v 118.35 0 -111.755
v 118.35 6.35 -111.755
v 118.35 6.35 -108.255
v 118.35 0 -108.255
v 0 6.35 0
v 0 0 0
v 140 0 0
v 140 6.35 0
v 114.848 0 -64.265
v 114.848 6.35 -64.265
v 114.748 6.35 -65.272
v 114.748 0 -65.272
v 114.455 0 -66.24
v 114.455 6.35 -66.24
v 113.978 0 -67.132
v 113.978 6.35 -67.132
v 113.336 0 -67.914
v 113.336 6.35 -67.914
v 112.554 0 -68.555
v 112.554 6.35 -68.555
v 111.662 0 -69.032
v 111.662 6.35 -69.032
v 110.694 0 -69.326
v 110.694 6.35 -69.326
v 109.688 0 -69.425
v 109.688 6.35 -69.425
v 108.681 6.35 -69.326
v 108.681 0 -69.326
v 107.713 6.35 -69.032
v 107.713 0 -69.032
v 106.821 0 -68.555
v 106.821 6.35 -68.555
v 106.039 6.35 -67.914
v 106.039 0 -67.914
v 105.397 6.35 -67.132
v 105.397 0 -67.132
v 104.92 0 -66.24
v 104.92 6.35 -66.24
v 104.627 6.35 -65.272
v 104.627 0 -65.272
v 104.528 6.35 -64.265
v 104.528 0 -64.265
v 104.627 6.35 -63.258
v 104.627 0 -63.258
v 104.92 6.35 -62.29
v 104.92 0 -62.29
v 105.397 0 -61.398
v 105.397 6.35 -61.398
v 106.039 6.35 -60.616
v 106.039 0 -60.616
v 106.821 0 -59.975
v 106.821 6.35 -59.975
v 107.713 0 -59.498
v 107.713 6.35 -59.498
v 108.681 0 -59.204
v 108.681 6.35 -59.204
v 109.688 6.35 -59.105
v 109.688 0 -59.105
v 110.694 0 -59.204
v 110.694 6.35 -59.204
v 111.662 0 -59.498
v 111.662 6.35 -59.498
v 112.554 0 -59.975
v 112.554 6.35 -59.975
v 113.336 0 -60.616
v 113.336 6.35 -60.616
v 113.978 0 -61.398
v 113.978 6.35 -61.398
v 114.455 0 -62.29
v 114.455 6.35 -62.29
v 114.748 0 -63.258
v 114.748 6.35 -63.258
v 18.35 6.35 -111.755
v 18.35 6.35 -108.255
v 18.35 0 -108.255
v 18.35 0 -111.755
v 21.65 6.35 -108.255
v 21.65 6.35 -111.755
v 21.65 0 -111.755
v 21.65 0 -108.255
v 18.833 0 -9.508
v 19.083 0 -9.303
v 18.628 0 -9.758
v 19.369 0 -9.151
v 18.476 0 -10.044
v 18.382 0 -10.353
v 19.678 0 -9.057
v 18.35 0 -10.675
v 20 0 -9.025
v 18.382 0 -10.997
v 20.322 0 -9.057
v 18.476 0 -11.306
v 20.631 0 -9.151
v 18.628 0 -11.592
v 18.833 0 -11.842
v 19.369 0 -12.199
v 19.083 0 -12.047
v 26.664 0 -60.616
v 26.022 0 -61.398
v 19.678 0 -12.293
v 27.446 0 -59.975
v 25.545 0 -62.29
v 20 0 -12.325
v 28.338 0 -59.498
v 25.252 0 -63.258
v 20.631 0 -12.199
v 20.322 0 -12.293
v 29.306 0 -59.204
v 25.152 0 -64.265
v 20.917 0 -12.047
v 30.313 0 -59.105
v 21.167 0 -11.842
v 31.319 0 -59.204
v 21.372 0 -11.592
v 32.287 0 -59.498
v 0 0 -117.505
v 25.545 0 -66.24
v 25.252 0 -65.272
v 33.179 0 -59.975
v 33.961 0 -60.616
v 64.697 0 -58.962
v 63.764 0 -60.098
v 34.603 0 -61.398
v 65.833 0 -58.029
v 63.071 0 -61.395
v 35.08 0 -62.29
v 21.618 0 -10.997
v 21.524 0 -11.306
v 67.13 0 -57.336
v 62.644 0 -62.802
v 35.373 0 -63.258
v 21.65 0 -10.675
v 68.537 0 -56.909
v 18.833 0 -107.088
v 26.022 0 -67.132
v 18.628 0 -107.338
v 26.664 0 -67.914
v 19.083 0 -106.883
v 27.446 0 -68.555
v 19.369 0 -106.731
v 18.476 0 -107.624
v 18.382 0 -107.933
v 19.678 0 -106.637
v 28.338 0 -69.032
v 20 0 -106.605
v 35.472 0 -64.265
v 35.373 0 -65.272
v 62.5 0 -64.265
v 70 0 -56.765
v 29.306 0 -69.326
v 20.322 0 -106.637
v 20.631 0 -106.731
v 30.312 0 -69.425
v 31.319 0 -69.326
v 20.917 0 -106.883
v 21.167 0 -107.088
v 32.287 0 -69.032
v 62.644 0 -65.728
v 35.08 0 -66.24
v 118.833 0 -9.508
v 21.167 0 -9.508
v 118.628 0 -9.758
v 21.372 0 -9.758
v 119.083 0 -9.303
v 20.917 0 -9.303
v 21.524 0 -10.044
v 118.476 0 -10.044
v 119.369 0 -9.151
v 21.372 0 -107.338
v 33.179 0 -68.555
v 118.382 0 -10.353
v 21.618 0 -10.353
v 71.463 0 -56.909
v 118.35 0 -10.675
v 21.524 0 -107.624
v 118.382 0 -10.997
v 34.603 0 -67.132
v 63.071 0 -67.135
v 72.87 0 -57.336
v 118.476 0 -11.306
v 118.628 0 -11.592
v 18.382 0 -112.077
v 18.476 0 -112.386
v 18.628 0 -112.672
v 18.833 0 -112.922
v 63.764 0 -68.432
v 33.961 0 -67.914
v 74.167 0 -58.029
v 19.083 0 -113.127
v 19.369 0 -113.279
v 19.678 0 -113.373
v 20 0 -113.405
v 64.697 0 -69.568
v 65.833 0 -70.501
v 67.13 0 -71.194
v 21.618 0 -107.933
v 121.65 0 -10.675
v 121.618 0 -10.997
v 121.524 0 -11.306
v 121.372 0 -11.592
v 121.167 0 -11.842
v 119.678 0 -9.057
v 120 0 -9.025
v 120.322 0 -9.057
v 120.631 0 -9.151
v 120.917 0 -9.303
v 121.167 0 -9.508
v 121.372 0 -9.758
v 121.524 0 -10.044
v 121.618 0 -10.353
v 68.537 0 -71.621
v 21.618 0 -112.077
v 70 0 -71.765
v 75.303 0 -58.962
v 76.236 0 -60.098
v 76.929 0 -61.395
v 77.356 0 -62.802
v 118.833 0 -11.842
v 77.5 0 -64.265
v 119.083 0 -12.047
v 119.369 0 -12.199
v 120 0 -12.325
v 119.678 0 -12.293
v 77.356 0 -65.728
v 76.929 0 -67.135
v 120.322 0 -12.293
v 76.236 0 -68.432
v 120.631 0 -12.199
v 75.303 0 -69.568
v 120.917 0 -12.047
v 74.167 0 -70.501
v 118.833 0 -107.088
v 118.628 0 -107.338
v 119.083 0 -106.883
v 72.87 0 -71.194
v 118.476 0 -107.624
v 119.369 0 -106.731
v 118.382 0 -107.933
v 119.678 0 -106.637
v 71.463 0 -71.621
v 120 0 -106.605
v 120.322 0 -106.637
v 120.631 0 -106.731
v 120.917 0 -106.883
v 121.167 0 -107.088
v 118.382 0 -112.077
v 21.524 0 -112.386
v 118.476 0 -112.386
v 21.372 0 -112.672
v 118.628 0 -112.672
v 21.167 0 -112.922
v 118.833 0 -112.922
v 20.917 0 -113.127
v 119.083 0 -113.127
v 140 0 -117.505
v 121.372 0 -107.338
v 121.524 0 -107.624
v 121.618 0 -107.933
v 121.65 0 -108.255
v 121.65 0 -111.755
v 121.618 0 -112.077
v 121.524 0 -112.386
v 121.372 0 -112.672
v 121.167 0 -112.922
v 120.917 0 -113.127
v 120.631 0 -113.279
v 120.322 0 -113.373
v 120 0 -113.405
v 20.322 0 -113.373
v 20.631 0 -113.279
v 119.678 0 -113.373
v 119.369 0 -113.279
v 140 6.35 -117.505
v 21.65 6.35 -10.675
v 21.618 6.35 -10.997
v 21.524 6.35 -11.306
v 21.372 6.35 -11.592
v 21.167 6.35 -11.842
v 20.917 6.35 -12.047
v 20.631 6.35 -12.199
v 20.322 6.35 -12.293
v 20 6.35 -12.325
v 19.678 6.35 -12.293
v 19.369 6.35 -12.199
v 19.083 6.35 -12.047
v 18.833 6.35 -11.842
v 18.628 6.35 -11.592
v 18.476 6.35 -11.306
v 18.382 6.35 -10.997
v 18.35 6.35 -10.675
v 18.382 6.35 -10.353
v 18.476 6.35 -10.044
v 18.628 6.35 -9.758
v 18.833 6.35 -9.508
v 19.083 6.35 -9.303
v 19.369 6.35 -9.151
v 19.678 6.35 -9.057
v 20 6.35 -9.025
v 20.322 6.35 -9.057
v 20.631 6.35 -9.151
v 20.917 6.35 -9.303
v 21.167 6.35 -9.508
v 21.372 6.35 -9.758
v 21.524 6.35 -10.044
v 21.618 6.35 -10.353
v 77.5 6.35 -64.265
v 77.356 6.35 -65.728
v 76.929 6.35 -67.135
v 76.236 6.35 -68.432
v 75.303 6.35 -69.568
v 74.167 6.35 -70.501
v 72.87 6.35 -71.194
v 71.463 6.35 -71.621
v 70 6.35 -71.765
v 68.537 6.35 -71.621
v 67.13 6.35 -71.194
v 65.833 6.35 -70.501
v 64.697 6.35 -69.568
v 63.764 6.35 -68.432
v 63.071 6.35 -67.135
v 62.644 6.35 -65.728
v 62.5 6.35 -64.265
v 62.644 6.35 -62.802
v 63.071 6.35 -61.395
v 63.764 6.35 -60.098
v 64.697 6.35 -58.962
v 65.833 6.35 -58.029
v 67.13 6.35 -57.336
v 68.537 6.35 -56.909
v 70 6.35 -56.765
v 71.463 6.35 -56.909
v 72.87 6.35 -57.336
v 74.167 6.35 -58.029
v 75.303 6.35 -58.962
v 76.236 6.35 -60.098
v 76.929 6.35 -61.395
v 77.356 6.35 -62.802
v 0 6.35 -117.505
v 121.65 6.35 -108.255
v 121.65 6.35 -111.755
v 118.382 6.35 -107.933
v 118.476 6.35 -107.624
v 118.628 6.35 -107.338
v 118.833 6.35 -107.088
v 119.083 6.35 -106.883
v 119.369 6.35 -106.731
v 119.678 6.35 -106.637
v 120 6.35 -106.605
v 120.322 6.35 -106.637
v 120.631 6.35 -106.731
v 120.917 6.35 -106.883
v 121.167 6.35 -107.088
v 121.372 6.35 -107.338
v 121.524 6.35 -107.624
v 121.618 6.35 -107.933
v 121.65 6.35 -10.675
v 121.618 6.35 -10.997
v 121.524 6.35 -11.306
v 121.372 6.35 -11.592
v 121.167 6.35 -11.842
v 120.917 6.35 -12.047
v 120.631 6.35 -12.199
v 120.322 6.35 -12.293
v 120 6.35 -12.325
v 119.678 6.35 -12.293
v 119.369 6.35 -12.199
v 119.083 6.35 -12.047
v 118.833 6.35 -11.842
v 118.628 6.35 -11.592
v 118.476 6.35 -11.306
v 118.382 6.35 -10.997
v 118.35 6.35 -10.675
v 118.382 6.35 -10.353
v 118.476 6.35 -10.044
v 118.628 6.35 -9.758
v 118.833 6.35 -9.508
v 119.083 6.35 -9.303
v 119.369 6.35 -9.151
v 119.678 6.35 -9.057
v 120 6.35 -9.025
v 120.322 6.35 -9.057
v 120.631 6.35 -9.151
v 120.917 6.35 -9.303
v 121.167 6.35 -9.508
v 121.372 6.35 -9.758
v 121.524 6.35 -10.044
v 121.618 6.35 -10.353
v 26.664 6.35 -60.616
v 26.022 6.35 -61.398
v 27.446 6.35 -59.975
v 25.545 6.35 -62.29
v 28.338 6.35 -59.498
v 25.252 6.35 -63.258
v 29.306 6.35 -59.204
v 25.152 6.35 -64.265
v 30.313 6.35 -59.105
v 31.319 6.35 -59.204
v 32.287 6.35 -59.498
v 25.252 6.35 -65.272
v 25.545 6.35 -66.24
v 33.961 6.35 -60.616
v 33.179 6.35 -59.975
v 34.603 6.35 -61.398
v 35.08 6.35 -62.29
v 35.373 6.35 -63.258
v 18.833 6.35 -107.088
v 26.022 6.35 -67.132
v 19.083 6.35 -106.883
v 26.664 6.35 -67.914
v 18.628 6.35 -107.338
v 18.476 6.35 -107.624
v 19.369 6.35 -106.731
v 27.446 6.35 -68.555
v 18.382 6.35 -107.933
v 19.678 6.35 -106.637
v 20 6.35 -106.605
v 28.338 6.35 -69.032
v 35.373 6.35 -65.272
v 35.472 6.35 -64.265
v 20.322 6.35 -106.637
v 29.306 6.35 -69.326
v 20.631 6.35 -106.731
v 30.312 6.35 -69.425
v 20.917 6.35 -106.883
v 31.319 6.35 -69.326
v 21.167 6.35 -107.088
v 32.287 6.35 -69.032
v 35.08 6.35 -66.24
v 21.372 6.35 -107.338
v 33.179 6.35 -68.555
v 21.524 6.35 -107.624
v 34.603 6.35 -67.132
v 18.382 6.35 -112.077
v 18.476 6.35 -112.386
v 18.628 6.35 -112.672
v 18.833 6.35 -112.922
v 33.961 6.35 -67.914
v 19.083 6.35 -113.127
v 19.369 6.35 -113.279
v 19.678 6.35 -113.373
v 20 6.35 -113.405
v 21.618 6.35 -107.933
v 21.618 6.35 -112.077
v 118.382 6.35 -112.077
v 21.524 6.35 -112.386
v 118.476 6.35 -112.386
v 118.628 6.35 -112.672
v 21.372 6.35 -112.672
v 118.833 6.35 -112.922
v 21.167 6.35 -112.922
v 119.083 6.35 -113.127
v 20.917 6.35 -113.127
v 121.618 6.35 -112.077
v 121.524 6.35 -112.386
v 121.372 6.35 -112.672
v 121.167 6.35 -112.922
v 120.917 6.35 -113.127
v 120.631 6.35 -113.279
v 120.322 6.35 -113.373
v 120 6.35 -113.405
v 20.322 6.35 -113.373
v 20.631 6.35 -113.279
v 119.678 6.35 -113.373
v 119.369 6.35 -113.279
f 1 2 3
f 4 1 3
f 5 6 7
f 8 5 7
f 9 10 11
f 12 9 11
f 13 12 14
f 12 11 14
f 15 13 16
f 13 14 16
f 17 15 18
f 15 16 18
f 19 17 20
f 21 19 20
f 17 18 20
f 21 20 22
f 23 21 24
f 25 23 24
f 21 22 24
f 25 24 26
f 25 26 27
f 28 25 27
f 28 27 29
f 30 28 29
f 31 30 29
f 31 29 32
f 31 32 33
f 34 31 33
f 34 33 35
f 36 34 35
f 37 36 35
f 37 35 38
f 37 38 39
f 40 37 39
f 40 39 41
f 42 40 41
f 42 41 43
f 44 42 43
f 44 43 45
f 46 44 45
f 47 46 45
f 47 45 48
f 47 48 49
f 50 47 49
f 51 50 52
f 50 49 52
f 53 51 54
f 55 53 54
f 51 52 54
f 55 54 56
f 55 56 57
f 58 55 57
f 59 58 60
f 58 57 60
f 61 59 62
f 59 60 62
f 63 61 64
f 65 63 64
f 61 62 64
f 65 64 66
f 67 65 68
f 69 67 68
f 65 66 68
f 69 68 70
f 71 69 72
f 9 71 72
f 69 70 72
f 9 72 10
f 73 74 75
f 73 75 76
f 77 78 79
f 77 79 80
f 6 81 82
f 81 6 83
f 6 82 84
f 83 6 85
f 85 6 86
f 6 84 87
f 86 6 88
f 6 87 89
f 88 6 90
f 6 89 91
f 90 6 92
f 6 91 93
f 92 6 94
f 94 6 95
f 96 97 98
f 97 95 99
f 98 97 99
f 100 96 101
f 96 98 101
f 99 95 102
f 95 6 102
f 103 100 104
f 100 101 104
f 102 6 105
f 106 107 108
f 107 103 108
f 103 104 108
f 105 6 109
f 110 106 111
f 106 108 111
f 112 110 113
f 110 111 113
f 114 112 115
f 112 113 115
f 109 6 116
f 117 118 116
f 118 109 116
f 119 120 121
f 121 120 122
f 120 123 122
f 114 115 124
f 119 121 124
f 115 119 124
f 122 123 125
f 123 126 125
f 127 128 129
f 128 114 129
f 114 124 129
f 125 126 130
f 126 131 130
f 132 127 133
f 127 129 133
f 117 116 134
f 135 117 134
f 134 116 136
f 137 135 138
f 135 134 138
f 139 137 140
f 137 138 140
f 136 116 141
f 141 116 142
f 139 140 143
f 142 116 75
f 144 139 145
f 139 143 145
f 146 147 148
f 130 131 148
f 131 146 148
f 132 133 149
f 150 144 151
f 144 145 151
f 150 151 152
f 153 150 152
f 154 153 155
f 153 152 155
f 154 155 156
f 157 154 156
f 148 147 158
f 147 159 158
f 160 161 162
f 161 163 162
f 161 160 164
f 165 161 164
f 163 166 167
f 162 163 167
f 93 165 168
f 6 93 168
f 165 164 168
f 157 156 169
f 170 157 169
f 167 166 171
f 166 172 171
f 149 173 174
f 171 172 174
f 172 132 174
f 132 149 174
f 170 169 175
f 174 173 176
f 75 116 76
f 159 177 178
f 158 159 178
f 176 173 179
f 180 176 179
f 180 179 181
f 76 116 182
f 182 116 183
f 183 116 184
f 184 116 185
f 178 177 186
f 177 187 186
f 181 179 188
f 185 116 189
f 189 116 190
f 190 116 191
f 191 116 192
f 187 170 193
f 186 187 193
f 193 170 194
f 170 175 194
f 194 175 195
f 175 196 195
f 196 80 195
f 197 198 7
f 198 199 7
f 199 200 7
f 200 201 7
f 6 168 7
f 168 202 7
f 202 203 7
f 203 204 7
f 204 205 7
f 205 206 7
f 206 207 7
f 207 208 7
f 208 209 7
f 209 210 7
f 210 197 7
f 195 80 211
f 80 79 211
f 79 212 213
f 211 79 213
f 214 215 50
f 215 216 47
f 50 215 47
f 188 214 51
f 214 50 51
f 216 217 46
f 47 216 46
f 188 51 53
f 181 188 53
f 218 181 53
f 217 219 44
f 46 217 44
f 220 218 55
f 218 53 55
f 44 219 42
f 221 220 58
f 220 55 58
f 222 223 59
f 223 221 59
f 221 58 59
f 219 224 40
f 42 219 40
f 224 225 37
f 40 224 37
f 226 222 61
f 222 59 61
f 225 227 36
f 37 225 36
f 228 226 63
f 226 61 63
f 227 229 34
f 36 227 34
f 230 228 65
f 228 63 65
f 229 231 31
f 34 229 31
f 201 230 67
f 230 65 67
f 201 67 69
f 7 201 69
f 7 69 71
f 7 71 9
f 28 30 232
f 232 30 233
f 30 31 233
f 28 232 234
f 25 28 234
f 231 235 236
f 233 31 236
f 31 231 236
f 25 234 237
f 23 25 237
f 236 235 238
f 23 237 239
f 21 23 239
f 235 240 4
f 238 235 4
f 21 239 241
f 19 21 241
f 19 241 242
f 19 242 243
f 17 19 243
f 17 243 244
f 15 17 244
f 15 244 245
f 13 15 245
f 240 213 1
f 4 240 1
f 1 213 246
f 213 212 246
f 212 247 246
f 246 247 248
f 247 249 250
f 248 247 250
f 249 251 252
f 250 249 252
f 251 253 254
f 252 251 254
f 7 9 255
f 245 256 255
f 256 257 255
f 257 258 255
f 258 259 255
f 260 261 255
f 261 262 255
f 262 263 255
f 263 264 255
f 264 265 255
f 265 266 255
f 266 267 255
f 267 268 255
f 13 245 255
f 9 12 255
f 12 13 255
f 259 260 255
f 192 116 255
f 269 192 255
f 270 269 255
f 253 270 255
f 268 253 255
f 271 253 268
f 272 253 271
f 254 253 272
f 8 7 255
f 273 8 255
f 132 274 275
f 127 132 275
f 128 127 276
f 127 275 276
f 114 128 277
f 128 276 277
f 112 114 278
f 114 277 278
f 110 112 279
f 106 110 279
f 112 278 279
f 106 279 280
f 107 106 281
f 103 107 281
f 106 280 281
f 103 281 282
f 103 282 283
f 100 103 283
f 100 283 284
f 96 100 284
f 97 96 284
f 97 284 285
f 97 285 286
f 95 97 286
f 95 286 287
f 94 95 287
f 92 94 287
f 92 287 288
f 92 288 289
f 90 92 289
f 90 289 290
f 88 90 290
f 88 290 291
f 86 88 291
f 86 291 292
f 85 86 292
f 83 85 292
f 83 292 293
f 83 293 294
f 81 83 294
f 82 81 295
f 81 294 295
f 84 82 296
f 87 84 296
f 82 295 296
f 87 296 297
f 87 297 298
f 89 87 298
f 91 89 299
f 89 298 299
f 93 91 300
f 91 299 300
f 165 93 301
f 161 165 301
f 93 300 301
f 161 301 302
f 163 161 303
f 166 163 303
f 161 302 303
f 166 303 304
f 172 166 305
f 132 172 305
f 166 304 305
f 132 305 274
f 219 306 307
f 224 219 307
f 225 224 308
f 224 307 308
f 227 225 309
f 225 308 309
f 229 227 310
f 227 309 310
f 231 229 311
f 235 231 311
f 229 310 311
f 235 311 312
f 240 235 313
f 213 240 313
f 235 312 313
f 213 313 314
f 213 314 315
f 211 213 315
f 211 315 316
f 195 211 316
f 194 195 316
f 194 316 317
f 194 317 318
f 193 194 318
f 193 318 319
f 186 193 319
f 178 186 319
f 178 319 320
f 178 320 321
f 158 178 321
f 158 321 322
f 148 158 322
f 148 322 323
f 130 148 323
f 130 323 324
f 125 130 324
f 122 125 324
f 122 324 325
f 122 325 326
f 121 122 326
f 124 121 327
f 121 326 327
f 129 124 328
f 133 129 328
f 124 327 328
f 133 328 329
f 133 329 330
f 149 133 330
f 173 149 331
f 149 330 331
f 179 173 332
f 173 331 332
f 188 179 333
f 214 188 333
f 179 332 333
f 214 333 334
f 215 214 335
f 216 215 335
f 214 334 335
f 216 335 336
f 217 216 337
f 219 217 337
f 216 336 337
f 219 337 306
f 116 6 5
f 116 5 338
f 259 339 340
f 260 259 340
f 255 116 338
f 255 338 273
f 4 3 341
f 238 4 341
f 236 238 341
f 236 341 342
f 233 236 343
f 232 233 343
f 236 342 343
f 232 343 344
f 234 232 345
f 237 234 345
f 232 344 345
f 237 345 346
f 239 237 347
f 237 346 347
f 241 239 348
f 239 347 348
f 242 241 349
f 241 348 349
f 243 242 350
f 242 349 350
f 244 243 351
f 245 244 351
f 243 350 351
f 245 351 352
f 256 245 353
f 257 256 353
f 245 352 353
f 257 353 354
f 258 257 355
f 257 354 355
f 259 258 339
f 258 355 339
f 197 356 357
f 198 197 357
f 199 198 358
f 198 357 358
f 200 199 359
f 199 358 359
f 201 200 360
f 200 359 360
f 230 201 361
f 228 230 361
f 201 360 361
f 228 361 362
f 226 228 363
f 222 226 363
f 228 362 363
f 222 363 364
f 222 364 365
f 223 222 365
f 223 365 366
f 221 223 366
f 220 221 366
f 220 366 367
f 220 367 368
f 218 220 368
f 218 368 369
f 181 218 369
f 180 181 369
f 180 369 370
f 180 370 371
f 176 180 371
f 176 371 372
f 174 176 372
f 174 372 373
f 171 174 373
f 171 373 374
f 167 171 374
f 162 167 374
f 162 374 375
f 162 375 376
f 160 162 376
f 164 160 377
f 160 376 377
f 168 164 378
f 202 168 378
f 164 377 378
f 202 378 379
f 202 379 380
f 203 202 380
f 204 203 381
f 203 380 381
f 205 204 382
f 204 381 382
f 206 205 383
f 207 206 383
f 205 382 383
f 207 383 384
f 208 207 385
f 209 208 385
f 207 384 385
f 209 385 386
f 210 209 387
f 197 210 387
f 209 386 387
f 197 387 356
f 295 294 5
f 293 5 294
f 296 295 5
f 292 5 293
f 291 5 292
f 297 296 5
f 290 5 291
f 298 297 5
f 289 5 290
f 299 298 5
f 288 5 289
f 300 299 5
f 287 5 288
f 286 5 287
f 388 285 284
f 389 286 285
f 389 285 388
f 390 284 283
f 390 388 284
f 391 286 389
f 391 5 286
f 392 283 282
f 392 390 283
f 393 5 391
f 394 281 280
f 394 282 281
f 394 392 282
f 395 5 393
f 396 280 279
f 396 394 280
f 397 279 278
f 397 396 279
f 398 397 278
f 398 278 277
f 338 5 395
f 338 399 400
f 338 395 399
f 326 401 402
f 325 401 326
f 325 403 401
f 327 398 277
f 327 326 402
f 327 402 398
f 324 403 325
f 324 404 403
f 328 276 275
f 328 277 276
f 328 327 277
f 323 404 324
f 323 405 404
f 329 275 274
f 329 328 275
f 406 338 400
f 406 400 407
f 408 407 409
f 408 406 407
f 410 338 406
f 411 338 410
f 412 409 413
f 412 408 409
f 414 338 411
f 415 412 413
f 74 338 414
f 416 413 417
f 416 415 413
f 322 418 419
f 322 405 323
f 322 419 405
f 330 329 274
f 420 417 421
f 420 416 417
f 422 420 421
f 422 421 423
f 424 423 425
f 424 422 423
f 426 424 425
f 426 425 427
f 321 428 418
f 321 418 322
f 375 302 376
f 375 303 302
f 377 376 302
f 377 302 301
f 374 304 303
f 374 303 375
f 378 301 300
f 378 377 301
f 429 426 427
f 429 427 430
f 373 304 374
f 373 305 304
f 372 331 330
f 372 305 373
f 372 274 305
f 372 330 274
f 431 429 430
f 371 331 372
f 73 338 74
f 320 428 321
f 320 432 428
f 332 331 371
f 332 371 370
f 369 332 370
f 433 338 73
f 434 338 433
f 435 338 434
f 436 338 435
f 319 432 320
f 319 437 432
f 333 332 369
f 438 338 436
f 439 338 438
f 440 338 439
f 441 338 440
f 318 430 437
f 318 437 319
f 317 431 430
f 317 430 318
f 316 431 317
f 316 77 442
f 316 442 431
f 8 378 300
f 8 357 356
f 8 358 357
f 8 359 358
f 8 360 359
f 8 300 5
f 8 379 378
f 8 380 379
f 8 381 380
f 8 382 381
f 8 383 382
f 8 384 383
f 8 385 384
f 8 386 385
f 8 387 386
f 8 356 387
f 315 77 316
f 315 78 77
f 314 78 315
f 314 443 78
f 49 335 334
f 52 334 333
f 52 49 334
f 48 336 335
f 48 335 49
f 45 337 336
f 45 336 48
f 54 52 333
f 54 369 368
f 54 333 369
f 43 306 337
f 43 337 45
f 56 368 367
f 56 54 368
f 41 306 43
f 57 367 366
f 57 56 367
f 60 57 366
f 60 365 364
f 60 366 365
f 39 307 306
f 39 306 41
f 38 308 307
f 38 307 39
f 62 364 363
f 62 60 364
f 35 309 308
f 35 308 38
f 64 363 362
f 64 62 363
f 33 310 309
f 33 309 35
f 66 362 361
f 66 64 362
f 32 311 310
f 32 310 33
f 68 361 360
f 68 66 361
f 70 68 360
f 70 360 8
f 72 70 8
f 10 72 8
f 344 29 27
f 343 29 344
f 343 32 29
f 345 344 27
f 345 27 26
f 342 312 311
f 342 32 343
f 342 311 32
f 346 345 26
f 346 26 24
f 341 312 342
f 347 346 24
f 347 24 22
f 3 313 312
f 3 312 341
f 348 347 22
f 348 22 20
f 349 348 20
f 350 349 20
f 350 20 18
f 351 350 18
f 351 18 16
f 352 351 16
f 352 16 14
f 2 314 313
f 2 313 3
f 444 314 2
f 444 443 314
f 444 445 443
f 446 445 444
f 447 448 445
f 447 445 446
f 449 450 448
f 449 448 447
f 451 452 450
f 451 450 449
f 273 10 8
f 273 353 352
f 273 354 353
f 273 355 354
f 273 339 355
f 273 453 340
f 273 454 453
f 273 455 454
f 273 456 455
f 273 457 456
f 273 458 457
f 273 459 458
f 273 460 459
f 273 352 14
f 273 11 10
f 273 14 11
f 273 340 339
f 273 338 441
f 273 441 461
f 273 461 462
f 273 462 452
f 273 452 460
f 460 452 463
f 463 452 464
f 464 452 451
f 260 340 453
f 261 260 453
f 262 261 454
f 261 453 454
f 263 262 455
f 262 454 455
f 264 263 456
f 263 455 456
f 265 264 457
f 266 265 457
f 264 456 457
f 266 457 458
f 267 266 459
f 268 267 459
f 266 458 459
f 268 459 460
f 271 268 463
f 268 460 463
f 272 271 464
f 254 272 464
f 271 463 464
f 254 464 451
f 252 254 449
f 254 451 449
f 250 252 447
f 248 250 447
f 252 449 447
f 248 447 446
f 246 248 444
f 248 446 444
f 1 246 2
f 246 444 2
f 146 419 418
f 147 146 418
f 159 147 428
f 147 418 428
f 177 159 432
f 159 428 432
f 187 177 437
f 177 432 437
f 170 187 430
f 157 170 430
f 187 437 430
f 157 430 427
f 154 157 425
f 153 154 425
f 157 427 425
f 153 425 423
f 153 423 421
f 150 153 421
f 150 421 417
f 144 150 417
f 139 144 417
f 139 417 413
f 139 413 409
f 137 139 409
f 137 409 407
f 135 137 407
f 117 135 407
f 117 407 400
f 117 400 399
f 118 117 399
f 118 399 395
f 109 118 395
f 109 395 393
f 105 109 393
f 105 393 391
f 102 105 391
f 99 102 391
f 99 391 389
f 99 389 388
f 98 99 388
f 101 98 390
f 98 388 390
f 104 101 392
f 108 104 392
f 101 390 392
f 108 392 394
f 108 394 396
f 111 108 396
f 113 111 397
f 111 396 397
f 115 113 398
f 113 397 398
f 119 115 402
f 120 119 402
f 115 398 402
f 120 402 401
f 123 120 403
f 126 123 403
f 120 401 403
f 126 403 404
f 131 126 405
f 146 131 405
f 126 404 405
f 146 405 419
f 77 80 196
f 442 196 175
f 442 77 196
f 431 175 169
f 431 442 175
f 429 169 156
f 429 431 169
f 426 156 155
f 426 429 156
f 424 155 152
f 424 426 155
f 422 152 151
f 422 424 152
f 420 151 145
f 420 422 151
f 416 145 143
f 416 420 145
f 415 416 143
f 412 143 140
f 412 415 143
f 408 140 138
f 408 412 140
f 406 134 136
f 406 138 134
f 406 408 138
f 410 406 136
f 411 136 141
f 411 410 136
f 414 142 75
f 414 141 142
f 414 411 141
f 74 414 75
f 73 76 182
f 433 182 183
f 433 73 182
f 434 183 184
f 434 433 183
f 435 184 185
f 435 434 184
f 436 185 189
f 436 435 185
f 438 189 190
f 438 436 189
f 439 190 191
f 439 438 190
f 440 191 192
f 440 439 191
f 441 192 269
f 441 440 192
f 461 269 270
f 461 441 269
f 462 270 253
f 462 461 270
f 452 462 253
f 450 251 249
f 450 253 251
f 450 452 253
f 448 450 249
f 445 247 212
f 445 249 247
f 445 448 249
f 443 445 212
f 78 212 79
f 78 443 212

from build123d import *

# Parameters (mm, degrees)
SKETCH1_W           = 140
SKETCH1_H           = 117.505
BOSS_EXTRUDE1_DEPTH = 6.35
SKETCH2_R           = 1.65
SKETCH2_R_2         = 7.5
SKETCH2_R_3         = 5.16
CUT_EXTRUDE1_DEPTH  = 7.35


with BuildPart() as part:
    # Sketch1 → Boss-Extrude1 (new body)
    with BuildSketch(Plane(origin=(0, 0, 0), x_dir=(1, 0, 0), z_dir=(0, 1, 0))):
        with Locations((70, 58.7525)):
            Rectangle(SKETCH1_W, SKETCH1_H)
    extrude(amount=BOSS_EXTRUDE1_DEPTH)

    # Sketch2 → Cut-Extrude1 (cut, through all)
    with BuildSketch(Plane(origin=(0, 6.35, 0), x_dir=(1, 0, 0), z_dir=(0, 1, 0))):
        with Locations((20, 10.675)):
            Circle(SKETCH2_R)
        with Locations((70, 64.265)):
            Circle(SKETCH2_R_2)
        with Locations((30.3125, 64.265)):
            Circle(SKETCH2_R_3)
        with Locations((120, 10.675)):
            Circle(SKETCH2_R)
        with Locations((109.6875, 64.265)):
            Circle(SKETCH2_R_3)
        with BuildLine():
            Line((18.35, 108.255), (18.35, 111.755))
            ThreePointArc((18.35, 111.755), (20, 113.405), (21.65, 111.755))
            Line((21.65, 111.755), (21.65, 108.255))
            ThreePointArc((21.65, 108.255), (20, 106.605), (18.35, 108.255))
        make_face()
        with BuildLine():
            Line((121.65, 108.255), (121.65, 111.755))
            ThreePointArc((121.65, 111.755), (120, 113.405), (118.35, 111.755))
            Line((118.35, 111.755), (118.35, 108.255))
            ThreePointArc((118.35, 108.255), (120, 106.605), (121.65, 108.255))
        make_face()
    extrude(amount=-CUT_EXTRUDE1_DEPTH, mode=Mode.SUBTRACT)


solid = part.part
